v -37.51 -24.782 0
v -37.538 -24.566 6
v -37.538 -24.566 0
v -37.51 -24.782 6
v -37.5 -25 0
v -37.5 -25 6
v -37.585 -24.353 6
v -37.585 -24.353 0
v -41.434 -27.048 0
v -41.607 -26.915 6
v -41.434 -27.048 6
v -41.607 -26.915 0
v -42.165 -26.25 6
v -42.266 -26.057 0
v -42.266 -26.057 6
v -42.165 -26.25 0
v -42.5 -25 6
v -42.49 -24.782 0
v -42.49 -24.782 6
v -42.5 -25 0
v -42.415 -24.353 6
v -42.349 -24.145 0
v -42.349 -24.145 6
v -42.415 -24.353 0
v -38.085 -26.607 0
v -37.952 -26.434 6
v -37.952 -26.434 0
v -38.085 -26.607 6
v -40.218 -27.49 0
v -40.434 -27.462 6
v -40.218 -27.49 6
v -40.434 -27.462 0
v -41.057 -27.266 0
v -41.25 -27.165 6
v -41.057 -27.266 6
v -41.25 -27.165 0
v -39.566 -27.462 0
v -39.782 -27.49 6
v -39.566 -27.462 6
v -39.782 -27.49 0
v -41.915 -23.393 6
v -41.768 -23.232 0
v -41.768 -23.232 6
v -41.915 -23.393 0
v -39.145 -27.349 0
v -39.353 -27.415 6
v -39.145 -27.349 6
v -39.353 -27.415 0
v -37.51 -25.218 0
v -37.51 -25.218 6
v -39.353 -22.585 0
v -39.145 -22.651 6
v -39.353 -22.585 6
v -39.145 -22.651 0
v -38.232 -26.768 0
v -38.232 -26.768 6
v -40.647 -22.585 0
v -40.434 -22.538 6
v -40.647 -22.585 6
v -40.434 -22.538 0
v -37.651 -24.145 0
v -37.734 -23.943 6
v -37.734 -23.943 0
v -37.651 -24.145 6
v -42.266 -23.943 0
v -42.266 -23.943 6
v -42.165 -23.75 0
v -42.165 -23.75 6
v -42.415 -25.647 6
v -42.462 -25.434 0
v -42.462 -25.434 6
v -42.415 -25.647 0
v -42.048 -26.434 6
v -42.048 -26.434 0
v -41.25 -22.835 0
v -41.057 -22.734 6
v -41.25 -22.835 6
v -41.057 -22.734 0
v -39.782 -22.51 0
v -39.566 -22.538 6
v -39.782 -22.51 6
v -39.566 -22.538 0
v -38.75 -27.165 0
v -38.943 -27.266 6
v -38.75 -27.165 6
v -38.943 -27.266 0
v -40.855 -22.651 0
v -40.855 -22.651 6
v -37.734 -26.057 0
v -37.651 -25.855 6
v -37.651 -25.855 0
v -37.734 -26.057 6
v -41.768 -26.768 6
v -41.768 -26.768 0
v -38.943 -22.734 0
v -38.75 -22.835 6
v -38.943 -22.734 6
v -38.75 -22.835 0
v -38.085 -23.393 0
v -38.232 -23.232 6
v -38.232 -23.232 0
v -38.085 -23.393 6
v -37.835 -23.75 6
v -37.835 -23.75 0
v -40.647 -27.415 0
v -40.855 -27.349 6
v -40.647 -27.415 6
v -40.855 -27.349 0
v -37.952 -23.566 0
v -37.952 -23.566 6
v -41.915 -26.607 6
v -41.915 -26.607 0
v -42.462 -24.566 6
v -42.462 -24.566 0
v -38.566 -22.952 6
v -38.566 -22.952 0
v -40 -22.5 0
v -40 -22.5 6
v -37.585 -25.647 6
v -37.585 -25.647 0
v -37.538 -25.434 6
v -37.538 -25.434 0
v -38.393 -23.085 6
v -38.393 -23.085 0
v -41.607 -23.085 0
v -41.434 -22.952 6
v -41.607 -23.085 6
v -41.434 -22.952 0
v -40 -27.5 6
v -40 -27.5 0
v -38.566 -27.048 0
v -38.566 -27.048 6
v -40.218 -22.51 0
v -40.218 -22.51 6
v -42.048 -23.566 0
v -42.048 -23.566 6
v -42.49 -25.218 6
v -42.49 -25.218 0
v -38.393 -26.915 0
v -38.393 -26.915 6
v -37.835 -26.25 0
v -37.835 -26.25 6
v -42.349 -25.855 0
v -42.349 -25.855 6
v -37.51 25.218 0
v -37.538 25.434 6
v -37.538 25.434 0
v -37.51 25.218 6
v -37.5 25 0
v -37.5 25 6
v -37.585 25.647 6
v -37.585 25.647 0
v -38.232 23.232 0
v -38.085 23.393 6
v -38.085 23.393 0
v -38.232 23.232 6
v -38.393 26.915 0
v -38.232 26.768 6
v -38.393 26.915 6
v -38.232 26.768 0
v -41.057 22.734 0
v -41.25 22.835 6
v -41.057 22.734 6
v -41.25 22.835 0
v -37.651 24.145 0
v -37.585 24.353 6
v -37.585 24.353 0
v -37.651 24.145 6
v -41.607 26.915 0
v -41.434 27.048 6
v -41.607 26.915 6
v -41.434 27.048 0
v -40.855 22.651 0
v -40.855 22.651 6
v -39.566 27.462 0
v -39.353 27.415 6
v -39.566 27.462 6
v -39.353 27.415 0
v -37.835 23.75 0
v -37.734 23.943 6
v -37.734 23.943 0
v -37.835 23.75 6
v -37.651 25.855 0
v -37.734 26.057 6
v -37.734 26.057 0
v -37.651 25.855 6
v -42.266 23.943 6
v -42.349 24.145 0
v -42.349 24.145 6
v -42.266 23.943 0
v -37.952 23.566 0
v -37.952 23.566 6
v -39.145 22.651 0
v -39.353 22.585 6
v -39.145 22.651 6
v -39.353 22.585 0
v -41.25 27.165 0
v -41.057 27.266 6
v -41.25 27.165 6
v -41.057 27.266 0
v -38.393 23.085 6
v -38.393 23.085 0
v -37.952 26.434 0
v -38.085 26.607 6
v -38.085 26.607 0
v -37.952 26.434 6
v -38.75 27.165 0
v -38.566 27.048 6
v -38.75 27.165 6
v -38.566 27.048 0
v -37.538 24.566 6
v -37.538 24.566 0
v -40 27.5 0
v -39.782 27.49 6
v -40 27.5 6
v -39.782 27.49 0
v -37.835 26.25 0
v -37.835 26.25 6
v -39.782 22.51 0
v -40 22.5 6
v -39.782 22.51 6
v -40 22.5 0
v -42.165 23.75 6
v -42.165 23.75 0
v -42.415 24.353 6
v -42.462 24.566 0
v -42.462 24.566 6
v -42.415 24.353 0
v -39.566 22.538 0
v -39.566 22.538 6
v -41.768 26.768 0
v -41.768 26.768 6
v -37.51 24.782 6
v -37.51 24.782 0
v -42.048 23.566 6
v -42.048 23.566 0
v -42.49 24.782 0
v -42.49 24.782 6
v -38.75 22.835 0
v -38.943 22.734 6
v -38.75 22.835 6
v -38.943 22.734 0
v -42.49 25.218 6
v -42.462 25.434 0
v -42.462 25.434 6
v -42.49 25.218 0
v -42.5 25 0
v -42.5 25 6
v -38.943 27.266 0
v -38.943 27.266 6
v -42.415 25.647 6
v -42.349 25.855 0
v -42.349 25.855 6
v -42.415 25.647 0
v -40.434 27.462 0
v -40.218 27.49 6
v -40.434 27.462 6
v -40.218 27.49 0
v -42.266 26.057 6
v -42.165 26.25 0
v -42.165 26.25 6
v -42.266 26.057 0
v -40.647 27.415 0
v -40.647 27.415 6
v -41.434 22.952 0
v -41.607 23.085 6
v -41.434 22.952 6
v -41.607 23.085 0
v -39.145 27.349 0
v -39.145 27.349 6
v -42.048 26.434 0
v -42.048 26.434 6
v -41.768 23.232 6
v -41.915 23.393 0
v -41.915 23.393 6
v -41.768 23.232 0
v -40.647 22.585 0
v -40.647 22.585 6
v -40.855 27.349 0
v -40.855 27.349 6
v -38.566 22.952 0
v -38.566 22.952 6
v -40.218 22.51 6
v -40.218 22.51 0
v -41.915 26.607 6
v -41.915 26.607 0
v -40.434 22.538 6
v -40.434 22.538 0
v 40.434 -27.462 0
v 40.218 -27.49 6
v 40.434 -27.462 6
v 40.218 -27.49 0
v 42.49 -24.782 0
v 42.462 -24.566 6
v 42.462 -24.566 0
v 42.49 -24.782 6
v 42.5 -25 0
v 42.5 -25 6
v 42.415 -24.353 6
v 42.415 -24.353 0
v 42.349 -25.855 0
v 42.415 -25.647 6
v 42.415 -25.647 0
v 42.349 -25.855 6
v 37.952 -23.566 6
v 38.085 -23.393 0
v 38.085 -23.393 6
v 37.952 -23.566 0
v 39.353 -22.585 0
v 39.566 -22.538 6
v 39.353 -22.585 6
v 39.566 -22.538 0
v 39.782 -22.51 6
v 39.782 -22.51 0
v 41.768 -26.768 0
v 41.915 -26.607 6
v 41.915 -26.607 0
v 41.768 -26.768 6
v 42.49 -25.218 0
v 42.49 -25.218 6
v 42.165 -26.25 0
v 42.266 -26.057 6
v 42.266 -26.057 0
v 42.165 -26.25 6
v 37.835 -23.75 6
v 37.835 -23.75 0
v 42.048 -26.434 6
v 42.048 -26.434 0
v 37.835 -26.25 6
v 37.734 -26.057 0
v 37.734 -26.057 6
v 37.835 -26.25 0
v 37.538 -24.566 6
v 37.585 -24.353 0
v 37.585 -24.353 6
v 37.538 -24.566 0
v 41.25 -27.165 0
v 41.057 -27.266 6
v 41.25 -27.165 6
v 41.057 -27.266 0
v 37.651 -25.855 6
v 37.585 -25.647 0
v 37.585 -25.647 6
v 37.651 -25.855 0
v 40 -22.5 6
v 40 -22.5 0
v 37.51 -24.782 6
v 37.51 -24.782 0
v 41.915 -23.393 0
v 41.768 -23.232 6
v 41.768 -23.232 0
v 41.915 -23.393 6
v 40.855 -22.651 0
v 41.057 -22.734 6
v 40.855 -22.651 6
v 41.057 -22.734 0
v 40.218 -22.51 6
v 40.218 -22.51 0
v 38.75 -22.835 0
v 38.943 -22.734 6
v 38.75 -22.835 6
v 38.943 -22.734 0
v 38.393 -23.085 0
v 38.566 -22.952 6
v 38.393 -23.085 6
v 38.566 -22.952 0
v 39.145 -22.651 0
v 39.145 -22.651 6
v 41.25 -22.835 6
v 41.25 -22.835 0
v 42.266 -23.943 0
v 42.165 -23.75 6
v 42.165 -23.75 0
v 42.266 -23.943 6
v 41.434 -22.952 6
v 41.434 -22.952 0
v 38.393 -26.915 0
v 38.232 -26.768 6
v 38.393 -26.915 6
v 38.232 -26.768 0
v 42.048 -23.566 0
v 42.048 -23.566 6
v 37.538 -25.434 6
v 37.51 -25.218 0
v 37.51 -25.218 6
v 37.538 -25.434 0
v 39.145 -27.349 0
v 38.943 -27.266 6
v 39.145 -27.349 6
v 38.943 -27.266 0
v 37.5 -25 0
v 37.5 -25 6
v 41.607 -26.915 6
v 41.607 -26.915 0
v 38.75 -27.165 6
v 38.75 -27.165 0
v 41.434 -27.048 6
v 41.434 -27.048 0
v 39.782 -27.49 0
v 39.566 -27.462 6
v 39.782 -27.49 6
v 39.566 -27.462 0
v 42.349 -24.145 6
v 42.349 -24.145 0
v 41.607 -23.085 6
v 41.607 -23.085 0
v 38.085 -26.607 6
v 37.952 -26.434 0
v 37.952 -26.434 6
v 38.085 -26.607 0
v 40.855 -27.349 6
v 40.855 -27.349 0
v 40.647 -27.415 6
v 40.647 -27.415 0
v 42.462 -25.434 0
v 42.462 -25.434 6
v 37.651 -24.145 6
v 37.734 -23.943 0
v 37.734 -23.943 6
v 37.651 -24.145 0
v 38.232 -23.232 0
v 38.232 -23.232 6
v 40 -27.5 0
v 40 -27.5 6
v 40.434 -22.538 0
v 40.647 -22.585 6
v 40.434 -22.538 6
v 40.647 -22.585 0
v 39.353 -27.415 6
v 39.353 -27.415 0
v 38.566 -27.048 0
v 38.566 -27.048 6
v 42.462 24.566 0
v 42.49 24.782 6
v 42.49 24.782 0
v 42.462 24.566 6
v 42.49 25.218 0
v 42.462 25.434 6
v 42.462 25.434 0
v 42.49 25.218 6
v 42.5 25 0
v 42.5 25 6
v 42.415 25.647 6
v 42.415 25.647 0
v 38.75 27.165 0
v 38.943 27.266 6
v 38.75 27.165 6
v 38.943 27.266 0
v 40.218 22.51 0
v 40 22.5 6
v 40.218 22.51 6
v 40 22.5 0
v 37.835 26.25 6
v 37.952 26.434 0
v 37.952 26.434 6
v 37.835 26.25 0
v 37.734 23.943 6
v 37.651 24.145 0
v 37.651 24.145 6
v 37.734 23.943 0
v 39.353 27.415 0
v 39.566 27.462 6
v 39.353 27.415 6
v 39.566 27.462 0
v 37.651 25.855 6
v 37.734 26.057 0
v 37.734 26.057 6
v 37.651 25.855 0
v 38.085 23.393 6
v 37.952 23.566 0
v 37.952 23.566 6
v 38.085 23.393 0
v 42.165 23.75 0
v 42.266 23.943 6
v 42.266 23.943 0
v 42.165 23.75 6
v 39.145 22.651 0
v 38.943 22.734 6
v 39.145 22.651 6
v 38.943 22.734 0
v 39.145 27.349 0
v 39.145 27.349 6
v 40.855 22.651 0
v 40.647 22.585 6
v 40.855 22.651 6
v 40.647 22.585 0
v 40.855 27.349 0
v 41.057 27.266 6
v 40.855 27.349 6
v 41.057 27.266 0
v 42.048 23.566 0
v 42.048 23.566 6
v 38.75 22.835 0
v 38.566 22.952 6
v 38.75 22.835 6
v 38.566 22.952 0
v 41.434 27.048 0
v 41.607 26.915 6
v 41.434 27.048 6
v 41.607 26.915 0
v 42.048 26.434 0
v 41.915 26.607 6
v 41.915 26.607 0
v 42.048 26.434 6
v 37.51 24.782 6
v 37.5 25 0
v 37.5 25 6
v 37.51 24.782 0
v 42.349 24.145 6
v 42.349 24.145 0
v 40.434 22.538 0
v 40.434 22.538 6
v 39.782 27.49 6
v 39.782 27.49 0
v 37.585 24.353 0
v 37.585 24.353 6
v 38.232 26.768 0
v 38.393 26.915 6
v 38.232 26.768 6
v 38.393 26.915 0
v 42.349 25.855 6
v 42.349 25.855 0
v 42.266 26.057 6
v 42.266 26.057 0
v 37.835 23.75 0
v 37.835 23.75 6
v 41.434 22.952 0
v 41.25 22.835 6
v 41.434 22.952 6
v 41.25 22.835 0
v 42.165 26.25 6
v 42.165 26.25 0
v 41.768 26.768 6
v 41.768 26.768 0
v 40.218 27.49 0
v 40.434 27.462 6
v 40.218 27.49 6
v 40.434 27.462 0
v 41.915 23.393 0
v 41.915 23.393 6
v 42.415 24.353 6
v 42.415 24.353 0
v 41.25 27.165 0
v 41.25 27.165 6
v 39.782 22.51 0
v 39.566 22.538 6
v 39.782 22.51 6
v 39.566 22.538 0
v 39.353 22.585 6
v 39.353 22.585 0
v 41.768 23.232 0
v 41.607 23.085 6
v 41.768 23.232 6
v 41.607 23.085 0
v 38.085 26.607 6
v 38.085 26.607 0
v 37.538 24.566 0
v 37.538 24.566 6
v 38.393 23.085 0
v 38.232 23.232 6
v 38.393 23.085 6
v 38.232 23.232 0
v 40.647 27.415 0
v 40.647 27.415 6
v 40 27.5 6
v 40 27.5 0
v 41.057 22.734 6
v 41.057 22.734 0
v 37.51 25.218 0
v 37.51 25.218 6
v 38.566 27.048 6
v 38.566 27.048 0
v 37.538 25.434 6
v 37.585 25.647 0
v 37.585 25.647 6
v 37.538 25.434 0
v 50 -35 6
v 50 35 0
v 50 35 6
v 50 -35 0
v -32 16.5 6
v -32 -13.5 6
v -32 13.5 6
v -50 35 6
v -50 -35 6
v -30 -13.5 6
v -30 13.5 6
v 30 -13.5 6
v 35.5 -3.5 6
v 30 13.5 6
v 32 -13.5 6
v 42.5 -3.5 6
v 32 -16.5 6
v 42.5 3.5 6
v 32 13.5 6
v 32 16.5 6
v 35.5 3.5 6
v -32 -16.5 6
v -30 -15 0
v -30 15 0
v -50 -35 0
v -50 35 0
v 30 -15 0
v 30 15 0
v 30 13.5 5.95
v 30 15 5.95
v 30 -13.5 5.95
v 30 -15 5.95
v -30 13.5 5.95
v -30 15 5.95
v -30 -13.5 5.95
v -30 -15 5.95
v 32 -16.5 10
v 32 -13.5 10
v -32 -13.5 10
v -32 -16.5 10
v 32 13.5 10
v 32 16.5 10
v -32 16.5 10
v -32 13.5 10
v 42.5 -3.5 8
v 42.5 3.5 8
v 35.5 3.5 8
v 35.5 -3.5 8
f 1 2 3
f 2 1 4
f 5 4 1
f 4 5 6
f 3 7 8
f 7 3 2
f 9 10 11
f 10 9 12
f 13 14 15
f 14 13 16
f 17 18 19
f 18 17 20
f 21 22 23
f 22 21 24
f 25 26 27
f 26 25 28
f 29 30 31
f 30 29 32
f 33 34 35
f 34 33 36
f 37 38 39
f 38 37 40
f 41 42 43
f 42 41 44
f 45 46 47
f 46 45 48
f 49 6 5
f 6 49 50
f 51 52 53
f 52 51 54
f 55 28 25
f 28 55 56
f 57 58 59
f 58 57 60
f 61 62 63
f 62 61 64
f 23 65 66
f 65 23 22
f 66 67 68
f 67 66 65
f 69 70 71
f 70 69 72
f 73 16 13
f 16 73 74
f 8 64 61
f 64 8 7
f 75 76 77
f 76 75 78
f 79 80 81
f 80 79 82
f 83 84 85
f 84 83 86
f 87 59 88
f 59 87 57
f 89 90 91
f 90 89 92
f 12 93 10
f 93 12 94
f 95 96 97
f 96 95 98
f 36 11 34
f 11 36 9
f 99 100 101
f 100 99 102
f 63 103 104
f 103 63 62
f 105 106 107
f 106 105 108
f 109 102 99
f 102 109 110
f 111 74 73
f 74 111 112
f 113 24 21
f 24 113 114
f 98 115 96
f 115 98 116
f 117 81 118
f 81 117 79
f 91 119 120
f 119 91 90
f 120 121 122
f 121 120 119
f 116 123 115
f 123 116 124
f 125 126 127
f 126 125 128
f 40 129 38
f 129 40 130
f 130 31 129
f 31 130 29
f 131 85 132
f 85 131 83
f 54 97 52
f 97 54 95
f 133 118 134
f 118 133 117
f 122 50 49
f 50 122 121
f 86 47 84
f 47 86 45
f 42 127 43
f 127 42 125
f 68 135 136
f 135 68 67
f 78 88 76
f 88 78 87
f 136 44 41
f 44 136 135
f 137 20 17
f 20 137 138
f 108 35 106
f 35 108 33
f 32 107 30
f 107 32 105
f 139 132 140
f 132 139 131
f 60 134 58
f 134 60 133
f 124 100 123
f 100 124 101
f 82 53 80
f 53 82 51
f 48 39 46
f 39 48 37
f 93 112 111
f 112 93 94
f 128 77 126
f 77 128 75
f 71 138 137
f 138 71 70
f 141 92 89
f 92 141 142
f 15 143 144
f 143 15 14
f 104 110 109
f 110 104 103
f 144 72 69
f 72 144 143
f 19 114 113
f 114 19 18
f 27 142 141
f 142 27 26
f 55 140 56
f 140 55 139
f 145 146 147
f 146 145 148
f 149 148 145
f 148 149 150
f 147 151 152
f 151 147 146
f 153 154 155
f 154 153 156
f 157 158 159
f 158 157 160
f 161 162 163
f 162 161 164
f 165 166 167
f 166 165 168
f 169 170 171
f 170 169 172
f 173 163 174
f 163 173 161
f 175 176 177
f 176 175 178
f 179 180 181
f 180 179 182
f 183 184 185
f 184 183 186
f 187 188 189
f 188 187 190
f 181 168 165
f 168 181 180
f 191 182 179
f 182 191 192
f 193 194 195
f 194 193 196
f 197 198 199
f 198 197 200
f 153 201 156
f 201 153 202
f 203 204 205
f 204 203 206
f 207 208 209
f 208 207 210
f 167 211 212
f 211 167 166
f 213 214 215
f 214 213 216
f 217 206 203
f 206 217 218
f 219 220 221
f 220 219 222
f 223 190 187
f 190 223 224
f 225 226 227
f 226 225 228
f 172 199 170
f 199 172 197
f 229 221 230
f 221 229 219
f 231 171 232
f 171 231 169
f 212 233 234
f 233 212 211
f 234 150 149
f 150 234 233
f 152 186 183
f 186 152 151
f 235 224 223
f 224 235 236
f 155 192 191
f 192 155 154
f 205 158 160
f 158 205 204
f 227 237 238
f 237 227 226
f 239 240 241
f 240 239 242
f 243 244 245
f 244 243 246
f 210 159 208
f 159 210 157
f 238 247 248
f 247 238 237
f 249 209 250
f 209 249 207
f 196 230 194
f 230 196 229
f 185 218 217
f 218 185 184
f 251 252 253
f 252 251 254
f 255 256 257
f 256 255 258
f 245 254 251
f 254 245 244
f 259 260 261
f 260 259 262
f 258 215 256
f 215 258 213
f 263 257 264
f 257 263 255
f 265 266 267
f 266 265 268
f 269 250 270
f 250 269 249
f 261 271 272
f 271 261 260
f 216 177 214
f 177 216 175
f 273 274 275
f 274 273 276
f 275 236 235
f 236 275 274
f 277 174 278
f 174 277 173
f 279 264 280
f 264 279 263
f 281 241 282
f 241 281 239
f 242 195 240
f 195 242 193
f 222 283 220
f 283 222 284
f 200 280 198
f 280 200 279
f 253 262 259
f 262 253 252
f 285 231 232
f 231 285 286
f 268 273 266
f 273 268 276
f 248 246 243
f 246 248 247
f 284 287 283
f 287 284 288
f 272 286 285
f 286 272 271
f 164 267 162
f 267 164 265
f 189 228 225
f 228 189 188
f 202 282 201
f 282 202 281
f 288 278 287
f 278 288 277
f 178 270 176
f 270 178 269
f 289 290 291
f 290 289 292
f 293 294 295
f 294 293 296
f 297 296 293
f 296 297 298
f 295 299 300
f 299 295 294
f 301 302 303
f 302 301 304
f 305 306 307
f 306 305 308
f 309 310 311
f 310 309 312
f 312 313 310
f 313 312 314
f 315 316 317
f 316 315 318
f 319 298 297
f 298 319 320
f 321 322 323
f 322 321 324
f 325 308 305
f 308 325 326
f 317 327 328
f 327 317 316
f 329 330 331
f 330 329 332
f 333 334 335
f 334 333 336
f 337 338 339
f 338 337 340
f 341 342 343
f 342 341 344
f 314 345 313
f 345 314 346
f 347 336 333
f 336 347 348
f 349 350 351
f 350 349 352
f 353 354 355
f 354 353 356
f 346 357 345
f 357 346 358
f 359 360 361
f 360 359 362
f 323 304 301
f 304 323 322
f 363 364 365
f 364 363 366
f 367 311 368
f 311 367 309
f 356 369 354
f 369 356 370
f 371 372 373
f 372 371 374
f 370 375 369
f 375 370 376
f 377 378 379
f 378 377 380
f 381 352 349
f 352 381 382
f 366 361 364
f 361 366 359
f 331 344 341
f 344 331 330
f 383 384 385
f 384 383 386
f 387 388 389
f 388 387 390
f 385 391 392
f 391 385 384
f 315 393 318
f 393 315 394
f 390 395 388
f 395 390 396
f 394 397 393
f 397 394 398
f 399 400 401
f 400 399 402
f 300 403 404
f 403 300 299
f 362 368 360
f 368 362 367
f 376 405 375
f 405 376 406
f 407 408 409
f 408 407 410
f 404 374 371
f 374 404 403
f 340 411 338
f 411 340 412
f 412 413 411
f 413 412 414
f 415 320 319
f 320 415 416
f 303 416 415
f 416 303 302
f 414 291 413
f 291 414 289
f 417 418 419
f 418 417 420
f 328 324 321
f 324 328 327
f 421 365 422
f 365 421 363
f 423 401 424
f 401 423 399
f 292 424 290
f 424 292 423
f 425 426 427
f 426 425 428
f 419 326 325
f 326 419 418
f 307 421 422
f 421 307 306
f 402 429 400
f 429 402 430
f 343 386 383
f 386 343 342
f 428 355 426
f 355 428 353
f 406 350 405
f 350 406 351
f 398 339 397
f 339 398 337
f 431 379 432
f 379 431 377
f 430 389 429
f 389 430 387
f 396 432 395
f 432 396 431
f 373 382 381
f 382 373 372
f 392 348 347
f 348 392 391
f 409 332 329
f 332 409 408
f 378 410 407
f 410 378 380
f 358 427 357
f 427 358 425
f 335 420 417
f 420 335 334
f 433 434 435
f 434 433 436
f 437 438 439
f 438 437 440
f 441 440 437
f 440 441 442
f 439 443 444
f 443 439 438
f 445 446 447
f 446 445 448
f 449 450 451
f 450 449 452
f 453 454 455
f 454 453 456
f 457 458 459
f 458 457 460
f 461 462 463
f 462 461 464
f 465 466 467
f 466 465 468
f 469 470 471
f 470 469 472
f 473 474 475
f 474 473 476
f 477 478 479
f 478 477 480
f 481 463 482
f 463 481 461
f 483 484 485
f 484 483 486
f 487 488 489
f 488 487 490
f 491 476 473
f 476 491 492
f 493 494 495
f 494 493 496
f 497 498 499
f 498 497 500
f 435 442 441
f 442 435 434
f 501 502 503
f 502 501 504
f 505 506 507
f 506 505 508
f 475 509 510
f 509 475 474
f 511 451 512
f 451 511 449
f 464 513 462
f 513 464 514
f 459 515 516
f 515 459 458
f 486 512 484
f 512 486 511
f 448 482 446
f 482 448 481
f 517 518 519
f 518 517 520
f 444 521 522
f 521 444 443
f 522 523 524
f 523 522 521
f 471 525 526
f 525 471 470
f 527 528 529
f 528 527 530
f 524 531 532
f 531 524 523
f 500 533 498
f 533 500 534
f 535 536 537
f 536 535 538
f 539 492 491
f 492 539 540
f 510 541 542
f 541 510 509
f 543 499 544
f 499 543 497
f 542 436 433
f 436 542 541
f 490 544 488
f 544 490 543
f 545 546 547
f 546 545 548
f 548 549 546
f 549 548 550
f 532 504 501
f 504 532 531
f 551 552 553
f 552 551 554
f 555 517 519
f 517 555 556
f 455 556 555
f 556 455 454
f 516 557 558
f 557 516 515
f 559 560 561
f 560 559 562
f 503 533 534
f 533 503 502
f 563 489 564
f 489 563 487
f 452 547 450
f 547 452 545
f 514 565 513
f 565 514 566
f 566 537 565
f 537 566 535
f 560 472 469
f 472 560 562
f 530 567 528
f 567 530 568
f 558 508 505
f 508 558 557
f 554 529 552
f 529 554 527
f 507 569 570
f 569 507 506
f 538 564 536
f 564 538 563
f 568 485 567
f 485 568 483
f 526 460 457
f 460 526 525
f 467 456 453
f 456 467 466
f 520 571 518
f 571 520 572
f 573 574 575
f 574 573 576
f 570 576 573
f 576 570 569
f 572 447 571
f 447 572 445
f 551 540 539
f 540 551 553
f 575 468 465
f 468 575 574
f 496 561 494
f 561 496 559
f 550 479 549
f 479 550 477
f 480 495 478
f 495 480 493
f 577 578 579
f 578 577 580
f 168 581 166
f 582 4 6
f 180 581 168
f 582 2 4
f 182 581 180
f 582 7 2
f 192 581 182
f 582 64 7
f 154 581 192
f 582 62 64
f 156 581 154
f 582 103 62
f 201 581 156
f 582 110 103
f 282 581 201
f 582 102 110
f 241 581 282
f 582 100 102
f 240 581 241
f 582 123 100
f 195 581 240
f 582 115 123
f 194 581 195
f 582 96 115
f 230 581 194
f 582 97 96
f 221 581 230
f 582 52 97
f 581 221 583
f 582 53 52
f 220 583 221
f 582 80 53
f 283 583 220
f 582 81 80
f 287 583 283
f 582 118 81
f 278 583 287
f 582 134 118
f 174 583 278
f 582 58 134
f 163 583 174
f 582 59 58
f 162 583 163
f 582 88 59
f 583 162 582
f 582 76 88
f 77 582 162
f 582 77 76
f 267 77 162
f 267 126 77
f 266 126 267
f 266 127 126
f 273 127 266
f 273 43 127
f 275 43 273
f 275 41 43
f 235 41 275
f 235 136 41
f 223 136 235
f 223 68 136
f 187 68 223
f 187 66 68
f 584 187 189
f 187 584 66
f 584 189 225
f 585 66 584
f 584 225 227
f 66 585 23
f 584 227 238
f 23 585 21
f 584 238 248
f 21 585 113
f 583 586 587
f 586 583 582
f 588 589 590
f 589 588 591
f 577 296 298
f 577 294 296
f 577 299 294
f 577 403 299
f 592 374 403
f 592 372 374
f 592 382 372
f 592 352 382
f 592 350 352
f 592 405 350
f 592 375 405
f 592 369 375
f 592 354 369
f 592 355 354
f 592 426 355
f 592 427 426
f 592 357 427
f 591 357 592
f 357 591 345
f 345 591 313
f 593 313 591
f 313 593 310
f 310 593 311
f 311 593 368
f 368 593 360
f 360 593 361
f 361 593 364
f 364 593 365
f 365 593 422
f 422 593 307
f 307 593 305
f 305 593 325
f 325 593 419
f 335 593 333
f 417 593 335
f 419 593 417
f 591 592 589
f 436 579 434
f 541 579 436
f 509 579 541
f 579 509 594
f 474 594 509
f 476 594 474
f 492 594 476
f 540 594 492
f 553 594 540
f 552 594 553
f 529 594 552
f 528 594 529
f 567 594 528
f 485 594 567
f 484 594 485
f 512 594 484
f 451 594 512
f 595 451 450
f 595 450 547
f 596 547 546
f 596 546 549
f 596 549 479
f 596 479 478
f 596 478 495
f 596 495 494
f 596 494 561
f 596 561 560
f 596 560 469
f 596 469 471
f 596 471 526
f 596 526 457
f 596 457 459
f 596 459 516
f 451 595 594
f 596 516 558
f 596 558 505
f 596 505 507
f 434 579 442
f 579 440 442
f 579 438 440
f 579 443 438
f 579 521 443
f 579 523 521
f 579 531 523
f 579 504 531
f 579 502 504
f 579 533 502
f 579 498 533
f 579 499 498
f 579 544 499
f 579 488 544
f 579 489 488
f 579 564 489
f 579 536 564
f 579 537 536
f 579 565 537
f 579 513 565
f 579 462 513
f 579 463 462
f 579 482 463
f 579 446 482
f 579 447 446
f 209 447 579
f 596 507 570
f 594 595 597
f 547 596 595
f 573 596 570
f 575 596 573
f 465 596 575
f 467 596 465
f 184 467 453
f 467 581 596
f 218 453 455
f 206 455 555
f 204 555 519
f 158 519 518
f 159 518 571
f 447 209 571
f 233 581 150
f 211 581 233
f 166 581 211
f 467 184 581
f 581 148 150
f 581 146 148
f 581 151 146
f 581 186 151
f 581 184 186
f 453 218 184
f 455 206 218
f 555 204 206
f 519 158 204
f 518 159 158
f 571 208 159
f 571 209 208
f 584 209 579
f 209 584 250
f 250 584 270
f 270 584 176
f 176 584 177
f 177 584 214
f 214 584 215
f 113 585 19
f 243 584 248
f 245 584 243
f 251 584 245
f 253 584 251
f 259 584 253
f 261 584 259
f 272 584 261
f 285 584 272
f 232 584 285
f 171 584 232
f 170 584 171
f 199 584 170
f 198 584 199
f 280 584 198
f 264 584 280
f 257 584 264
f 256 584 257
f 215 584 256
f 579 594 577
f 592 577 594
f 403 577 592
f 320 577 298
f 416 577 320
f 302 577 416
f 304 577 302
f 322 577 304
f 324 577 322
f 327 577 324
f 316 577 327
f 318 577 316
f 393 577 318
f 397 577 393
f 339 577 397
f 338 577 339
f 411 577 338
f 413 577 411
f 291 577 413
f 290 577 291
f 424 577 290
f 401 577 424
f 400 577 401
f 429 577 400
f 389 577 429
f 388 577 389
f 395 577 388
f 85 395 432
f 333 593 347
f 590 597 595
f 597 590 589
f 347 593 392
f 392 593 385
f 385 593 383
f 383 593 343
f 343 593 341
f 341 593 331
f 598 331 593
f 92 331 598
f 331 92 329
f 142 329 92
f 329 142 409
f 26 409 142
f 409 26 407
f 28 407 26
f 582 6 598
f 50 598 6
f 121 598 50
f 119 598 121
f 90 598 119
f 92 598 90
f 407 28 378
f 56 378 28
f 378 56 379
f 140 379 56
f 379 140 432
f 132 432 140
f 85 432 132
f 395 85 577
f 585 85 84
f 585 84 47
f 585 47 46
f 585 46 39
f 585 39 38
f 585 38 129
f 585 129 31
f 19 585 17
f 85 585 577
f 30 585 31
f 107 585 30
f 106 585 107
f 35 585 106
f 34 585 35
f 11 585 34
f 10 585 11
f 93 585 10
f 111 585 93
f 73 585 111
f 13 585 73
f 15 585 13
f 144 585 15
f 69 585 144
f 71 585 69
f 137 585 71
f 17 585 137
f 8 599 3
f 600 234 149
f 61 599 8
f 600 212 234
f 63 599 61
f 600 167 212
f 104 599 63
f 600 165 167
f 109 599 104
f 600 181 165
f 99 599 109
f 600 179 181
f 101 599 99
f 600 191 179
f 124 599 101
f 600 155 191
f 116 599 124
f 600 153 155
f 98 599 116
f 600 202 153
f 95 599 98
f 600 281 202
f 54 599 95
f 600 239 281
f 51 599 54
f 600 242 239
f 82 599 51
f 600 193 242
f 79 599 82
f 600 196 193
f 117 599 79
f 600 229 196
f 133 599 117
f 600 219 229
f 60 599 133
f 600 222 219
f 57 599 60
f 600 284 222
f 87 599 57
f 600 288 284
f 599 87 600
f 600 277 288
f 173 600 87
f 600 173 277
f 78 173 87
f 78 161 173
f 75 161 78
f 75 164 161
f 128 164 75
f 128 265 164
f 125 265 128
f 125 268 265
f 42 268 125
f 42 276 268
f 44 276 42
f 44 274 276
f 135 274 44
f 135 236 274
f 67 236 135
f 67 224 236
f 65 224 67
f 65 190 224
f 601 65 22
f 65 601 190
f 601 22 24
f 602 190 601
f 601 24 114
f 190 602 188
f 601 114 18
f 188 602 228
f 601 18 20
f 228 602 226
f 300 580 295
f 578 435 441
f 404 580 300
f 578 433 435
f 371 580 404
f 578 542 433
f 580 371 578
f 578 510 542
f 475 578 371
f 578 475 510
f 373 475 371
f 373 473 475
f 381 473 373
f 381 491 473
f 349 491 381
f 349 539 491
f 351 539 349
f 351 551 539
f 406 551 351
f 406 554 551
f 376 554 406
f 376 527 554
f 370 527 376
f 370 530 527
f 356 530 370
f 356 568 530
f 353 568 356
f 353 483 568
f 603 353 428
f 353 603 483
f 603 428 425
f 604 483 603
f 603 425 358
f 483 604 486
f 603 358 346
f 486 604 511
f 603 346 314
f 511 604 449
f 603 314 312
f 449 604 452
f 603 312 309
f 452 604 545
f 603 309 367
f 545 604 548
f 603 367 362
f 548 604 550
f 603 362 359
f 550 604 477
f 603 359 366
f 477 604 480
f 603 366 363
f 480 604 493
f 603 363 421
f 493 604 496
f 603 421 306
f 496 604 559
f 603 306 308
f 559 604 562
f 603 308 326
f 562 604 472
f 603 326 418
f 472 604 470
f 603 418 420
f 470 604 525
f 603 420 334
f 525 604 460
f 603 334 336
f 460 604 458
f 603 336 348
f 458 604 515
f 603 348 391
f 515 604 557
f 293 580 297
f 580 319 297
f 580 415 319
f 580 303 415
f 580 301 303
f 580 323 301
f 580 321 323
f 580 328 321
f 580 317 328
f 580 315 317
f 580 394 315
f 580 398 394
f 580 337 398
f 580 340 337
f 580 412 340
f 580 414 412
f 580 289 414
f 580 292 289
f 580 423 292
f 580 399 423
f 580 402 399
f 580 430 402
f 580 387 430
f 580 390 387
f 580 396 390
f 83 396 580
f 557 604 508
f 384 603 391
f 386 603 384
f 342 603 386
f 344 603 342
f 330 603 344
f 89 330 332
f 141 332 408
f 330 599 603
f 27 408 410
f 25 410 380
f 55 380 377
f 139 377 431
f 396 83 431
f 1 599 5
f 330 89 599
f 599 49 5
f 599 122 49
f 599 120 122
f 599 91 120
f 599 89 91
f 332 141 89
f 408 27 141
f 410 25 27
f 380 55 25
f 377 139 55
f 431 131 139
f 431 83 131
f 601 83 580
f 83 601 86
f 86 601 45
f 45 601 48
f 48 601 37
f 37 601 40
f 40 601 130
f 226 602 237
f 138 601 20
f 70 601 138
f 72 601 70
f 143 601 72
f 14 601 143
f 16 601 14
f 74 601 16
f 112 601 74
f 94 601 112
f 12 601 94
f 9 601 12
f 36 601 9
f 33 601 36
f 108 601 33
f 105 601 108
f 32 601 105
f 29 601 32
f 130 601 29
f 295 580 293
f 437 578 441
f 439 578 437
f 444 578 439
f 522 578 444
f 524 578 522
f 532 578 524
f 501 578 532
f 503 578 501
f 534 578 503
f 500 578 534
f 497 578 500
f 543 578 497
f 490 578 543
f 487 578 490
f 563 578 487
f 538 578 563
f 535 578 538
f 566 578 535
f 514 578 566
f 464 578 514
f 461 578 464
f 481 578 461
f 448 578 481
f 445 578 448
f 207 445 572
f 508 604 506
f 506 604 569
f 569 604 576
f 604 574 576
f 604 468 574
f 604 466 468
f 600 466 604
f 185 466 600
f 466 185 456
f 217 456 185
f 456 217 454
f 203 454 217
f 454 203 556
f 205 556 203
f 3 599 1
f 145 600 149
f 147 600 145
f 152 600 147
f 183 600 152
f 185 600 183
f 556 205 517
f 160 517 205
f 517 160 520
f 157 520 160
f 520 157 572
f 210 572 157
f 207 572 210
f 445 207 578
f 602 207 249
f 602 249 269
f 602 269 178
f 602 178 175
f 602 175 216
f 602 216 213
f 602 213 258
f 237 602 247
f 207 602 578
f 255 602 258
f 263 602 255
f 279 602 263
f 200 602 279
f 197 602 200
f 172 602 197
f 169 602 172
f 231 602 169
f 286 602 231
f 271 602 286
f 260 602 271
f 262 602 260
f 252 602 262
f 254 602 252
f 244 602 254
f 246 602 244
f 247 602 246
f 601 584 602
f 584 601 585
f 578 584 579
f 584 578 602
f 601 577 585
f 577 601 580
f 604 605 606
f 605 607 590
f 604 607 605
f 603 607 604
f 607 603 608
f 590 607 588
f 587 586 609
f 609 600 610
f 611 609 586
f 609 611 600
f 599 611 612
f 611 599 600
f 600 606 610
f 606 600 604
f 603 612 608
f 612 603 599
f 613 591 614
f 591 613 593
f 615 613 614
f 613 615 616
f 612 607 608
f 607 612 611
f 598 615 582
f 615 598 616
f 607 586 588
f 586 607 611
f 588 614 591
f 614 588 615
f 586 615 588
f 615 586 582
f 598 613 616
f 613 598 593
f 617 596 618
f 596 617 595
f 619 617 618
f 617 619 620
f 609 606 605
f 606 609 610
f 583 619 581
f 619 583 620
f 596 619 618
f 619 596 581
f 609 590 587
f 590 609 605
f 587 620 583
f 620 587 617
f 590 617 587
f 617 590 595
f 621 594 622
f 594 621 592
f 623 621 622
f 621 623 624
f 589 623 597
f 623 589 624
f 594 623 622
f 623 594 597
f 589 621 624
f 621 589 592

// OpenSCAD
// Microfluidic chip imaging holder — reference solution
// Category: tools; purpose: repeatable positioning during optical chip imaging
// Print on flat base with z=0 on bed; PLA/PETG, no supports; not certified for clinical or sterile use
// SPDX-License-Identifier: CERN-OHL-P-2.0
$fn=72;
eps=0.05;
base_x=100;
base_y=70;
base_h=6;
window_x=60;
window_y=30;
hole_d=5;
hole_pitch_x=80;
hole_pitch_y=50;
rail_len=64;
rail_width=3;
rail_h=4;
rail_center_y=15.0;
marker_x=7;
marker_y=7;
marker_h=2;
marker_center_x=39;
assert(base_x > window_x + 2*hole_d);
assert(base_y > window_y + 2*hole_d);
assert(hole_pitch_x/2+hole_d/2 < base_x/2);
assert(hole_pitch_y/2+hole_d/2 < base_y/2);
// wrong rail position deliberately violates safety gap
module reference(){
 union(){
  difference(){
   translate([-base_x/2,-base_y/2,0]) cube([base_x,base_y,base_h]);
   translate([-window_x/2,-window_y/2,-eps]) cube([window_x,window_y,base_h+2*eps]);
   for(x=[-hole_pitch_x/2,hole_pitch_x/2])
    for(y=[-hole_pitch_y/2,hole_pitch_y/2])
     translate([x,y,-eps]) cylinder(d=hole_d,h=base_h+2*eps);
  }
  for(y=[-rail_center_y,rail_center_y])
   translate([-rail_len/2,y-rail_width/2,base_h-eps])
    cube([rail_len,rail_width,rail_h+eps]);
  translate([marker_center_x-marker_x/2,-marker_y/2,base_h-eps])
   cube([marker_x,marker_y,marker_h+eps]);
 }
}
reference();
